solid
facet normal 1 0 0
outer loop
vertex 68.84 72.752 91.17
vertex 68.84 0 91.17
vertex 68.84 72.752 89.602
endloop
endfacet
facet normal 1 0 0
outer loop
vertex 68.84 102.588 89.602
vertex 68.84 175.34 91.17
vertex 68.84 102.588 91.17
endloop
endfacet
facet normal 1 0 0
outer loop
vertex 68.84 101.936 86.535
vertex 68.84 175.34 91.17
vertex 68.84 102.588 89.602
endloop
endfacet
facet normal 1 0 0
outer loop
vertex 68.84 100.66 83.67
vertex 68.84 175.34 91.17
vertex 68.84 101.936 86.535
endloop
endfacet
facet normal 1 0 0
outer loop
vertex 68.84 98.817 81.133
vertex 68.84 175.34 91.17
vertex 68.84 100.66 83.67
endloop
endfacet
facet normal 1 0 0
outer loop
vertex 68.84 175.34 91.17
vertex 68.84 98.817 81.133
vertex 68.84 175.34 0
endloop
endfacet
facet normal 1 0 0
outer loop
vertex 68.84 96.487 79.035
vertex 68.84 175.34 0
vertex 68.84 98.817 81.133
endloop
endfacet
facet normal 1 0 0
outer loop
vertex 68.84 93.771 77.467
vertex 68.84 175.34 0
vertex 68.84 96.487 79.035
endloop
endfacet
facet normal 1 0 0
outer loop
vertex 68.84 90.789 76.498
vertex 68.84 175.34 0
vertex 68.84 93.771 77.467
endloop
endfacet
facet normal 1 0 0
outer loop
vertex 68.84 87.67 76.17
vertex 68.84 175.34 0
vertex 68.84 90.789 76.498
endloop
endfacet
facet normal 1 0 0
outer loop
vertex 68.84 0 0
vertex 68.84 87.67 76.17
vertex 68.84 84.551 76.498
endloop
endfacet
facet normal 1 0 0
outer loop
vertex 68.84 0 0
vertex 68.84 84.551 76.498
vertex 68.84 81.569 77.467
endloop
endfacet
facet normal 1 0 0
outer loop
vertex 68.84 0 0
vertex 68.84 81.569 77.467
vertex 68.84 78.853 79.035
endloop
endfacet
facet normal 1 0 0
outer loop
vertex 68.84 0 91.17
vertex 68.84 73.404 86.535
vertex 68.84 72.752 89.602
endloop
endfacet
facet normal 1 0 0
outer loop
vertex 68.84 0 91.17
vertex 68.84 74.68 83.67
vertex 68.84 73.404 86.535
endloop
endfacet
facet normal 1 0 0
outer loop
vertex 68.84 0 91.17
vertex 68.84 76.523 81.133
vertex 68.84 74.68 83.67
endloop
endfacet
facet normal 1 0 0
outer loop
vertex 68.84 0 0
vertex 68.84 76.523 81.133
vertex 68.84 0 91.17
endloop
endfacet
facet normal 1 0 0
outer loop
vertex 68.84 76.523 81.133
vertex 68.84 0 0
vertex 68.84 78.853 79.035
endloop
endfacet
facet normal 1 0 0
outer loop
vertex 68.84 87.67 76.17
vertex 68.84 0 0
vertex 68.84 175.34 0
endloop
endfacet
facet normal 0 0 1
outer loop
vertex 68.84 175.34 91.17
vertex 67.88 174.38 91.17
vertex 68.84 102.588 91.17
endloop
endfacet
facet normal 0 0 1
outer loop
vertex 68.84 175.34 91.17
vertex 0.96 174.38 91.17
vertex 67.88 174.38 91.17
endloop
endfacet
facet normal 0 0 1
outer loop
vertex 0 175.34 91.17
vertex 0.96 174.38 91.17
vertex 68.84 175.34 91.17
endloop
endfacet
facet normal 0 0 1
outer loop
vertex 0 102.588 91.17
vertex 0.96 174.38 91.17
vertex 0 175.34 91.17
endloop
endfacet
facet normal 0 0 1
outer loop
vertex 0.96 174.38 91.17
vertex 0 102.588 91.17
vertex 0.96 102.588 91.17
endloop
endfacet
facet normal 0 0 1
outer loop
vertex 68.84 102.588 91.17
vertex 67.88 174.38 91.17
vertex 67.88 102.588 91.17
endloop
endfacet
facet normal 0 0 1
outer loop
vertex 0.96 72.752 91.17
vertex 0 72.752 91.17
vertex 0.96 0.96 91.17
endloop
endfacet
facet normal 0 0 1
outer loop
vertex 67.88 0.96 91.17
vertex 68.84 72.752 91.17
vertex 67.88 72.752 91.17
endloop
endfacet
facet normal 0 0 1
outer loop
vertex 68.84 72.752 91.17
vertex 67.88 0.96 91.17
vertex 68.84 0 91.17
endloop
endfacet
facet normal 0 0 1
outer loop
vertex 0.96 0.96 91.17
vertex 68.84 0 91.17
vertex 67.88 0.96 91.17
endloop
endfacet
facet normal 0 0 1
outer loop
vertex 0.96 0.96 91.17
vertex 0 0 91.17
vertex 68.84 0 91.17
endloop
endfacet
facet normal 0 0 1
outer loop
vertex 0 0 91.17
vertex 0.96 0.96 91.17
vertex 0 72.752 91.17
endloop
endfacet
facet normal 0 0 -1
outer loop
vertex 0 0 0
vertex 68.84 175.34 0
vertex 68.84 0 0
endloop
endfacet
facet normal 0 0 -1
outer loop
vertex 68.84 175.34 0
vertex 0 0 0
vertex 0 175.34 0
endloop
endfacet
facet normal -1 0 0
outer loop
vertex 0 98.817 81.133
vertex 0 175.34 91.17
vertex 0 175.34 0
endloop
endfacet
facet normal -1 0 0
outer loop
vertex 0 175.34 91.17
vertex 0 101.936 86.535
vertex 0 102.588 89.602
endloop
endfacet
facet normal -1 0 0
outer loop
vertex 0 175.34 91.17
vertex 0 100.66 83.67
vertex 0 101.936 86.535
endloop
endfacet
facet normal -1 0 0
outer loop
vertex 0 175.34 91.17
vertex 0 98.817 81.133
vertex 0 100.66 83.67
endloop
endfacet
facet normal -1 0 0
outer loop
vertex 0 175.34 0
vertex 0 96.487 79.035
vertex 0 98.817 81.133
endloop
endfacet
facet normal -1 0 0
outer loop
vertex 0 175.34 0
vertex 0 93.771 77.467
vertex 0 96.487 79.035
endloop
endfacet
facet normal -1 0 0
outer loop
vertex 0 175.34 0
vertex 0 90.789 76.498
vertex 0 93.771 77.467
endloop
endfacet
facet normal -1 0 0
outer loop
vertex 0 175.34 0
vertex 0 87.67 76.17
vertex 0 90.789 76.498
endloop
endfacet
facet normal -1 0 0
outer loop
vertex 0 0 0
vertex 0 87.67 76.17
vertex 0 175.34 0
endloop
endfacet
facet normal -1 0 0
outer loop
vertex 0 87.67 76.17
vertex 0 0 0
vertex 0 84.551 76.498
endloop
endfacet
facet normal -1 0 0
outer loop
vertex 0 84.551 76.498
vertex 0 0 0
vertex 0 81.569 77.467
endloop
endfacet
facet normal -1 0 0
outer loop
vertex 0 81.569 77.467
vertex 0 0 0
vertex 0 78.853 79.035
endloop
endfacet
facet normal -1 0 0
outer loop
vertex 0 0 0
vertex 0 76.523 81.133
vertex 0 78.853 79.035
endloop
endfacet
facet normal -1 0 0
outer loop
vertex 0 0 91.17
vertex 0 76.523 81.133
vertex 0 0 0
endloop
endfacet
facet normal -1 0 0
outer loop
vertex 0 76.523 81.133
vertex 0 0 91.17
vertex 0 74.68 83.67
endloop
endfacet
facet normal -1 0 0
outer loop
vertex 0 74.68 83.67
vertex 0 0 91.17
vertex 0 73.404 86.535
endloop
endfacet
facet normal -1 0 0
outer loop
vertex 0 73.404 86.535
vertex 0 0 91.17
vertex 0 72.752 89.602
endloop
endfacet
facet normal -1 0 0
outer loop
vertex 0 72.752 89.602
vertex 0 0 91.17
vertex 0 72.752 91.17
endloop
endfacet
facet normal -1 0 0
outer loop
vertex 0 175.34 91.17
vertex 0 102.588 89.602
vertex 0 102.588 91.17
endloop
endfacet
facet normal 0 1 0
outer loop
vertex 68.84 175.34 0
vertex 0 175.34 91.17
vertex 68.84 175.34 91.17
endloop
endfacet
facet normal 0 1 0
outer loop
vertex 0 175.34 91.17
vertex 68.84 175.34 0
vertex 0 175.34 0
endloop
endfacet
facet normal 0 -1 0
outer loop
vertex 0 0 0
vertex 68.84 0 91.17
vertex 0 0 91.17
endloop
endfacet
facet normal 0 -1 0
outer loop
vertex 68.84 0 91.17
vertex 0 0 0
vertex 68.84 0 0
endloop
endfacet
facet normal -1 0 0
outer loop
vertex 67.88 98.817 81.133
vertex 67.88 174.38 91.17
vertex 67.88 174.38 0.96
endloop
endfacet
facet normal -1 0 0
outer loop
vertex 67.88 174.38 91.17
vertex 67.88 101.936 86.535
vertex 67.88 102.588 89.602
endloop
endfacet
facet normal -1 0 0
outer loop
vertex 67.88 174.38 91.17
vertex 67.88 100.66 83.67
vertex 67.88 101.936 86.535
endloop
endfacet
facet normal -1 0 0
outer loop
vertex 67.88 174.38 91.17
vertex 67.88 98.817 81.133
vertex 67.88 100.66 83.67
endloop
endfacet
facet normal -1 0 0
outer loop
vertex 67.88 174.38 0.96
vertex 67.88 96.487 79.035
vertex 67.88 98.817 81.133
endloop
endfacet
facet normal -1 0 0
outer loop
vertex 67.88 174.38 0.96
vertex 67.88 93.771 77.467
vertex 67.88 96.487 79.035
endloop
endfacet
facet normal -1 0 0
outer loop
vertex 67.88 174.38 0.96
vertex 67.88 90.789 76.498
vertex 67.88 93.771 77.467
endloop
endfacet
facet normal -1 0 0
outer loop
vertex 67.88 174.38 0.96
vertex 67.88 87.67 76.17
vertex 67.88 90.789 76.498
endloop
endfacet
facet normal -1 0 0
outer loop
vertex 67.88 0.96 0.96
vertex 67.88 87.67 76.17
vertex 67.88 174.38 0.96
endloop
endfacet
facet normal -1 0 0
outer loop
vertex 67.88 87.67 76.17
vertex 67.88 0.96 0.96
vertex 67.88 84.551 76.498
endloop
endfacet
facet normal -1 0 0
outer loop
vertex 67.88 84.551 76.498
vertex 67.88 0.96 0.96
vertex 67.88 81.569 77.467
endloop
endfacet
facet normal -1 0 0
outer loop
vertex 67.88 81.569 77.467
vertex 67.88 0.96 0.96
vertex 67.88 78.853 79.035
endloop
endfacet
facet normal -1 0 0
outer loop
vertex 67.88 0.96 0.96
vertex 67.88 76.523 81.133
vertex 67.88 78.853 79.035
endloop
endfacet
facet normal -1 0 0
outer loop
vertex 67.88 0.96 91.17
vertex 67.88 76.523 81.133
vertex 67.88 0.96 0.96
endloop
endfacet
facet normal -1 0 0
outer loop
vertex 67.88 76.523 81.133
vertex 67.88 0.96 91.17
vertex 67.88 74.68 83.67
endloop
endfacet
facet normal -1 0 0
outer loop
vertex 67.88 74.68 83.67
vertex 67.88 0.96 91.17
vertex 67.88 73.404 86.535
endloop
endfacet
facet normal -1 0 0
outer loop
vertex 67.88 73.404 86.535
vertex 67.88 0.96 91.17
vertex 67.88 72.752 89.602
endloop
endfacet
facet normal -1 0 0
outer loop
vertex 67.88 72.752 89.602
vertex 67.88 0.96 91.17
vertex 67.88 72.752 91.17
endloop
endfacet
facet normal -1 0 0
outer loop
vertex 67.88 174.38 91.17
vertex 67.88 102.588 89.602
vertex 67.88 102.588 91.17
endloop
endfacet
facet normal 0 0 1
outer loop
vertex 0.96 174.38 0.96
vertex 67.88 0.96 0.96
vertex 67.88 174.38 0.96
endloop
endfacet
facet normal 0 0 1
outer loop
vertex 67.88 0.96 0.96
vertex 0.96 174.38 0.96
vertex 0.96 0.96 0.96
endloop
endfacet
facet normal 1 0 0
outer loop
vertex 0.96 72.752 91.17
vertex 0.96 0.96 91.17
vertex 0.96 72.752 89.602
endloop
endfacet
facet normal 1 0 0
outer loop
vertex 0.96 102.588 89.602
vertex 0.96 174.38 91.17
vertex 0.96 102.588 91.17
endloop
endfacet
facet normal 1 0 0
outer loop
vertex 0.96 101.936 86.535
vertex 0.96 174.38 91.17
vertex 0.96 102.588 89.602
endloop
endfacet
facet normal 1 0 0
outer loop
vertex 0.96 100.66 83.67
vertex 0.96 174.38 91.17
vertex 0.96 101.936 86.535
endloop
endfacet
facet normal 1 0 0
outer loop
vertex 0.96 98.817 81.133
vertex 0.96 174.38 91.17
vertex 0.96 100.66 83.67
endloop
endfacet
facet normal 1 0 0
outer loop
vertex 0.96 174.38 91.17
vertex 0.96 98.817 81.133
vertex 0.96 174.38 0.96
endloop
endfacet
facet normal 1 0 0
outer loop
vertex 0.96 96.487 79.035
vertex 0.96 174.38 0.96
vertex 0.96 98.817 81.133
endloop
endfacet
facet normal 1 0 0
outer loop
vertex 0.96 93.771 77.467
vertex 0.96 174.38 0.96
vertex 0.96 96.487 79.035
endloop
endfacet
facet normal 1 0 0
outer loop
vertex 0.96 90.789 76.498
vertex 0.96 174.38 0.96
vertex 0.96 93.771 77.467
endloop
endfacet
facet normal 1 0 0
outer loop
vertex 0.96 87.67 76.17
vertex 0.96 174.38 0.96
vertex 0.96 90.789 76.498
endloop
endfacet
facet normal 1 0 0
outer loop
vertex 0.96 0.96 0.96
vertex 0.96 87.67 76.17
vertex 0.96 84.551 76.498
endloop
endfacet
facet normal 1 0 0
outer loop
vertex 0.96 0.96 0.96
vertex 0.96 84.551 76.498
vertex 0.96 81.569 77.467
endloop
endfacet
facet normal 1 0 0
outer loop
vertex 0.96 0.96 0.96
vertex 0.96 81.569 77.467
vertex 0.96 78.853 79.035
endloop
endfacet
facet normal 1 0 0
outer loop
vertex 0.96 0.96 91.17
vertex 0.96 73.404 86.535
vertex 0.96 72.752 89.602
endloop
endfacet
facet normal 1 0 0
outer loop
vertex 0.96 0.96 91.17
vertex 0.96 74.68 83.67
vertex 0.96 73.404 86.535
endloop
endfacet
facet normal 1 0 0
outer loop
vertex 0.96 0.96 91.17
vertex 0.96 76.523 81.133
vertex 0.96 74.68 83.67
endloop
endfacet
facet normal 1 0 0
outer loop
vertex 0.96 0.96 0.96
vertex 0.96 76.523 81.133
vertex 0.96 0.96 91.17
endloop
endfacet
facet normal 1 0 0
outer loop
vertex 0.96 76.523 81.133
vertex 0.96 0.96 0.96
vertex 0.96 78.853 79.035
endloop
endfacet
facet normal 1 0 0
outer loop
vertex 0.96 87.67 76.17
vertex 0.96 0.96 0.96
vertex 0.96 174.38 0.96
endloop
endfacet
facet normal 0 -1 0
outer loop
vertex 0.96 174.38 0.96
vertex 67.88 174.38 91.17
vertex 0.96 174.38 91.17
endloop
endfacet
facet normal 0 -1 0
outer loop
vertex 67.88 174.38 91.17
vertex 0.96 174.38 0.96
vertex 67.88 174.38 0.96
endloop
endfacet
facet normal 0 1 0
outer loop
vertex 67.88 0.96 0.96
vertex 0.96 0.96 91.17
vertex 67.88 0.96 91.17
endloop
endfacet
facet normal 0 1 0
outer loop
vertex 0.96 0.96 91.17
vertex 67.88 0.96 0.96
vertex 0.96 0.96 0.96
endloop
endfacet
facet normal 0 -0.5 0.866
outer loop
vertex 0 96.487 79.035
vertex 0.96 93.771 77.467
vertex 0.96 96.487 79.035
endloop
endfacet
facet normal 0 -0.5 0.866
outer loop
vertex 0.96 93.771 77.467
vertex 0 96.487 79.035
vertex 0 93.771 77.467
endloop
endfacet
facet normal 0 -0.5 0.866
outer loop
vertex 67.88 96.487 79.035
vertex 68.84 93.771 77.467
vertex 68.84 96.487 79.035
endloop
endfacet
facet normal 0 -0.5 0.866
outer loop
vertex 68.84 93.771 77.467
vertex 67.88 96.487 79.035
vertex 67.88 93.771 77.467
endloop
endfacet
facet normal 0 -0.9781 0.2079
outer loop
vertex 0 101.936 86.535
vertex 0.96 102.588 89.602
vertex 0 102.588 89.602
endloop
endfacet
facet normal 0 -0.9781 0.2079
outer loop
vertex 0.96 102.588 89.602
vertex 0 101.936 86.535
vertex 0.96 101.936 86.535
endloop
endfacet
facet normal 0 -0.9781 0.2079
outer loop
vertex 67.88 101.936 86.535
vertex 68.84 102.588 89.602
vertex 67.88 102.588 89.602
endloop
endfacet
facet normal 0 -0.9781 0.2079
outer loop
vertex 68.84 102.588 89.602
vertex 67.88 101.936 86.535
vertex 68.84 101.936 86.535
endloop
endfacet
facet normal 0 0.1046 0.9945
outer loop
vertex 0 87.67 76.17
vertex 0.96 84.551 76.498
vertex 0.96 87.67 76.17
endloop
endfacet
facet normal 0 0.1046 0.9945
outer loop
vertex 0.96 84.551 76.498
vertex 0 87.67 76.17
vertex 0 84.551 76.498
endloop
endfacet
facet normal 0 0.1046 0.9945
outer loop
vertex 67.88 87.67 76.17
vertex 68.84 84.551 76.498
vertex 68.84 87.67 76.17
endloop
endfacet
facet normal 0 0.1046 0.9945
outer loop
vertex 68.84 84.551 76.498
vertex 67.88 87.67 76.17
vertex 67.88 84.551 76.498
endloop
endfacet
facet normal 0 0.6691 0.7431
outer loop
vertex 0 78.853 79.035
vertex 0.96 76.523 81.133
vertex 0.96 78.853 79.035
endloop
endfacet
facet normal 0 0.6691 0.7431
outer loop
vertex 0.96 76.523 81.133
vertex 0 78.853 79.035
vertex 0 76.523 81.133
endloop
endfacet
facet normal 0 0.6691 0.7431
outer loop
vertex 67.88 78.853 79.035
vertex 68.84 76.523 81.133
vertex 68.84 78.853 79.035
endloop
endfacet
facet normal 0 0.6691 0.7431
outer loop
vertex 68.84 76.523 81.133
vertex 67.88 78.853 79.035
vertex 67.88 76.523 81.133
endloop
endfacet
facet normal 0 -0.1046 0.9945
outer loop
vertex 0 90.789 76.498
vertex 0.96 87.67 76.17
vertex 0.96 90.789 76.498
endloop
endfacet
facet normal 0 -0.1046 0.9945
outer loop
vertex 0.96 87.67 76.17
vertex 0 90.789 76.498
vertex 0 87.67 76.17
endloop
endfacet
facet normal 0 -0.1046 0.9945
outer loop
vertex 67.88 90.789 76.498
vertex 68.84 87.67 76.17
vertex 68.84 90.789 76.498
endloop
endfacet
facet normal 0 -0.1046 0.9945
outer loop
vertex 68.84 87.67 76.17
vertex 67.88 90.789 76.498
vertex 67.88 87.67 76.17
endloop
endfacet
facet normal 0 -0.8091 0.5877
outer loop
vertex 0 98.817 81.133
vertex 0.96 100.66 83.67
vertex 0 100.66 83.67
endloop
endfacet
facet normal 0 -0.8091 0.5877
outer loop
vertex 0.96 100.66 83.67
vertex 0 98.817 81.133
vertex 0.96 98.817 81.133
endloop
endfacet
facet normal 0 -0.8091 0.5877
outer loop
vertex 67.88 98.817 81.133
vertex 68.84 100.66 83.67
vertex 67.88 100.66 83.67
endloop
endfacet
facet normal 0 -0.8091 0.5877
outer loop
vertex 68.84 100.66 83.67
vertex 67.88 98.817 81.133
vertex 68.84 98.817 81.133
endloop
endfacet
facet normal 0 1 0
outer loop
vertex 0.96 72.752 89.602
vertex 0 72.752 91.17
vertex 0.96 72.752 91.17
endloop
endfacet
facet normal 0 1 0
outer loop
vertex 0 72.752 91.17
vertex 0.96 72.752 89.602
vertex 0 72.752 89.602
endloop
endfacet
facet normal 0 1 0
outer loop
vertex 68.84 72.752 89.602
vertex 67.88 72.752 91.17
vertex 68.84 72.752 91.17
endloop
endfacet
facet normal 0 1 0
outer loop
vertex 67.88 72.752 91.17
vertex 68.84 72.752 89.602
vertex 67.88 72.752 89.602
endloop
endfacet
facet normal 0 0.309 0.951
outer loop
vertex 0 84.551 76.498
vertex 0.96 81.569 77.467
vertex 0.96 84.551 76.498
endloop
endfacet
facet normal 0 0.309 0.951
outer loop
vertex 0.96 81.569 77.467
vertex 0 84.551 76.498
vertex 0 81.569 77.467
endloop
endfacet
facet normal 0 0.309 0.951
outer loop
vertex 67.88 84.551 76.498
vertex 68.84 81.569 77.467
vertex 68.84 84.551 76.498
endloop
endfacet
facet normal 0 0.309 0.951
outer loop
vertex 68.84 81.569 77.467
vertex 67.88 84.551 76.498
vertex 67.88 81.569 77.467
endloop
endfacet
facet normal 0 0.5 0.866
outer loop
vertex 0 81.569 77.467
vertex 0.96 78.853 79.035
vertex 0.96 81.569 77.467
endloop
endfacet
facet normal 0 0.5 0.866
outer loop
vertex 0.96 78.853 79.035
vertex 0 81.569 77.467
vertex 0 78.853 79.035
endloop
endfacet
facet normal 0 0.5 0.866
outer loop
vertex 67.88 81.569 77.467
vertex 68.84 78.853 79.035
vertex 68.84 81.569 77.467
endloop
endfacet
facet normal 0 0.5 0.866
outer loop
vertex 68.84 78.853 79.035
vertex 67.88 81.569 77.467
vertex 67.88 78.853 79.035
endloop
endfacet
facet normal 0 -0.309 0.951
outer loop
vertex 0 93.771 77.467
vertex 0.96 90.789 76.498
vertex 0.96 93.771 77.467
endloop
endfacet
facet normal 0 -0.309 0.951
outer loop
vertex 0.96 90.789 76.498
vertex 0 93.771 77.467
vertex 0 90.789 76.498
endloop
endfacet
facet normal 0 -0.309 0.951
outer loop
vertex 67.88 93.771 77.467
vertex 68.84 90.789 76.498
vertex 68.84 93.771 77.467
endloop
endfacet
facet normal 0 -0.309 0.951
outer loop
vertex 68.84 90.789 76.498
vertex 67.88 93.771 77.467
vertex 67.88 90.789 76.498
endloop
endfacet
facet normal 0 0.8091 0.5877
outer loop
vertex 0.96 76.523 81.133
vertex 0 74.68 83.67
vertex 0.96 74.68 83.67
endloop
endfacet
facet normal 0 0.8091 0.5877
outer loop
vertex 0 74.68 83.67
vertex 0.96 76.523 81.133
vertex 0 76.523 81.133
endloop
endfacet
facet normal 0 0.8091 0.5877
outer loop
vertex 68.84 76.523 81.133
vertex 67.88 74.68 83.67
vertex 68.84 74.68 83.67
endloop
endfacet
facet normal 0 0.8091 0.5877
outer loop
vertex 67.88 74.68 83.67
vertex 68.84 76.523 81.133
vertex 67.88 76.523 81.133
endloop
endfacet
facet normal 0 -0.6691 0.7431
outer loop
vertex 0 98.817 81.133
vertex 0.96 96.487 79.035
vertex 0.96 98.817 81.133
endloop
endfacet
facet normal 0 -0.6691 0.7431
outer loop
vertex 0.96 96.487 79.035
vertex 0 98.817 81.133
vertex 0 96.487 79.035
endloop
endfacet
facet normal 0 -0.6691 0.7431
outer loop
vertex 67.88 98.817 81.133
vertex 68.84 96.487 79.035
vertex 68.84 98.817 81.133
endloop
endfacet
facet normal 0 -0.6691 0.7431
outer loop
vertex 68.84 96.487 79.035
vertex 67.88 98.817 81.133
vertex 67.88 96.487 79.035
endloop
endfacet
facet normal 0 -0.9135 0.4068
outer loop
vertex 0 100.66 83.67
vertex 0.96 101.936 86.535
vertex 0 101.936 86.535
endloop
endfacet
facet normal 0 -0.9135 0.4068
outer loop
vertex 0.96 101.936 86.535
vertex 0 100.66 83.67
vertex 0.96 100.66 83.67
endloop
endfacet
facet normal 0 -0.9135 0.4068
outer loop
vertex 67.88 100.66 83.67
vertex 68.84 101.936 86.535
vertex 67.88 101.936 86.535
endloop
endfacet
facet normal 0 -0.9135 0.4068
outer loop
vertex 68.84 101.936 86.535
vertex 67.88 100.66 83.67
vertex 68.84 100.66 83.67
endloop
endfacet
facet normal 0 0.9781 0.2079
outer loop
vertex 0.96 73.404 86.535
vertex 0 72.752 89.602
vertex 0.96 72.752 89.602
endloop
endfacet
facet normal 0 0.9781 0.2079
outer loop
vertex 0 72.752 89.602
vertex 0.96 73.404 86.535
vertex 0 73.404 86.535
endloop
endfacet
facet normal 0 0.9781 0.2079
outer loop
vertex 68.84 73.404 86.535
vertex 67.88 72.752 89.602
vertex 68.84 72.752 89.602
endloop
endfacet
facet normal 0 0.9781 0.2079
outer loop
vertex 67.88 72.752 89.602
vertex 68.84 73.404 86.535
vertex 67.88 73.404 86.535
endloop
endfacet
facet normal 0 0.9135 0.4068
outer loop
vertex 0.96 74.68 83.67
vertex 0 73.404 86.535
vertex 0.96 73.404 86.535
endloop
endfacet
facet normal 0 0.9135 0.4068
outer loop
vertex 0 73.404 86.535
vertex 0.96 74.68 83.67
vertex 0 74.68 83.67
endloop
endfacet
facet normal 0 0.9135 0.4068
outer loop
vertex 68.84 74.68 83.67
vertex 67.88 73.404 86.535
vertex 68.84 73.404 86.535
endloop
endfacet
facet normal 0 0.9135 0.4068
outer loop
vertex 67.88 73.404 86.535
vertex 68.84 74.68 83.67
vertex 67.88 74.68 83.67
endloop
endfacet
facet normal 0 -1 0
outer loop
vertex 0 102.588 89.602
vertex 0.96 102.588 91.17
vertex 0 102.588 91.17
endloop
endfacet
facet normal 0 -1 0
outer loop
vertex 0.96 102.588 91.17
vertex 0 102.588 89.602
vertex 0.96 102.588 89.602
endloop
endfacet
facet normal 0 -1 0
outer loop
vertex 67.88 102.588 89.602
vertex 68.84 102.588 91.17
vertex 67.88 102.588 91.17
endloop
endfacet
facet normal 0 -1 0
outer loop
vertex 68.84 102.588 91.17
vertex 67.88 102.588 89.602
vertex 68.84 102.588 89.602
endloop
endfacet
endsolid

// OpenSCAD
cardWidth=63.5;
cardHeight=88.5;
cardThickness=0.34;

cardPerBox=500;
cardBlockLength=cardThickness*cardPerBox;

spaceAroundCard=0.25;
spaceAroundLid=0.5;

wallthickness=0.96;

fingerCutout=30;

// 1 for base box, 0 for lid
boxOrLid=0;

if (boxOrLid) {
    mainBox();
} else {
    mainLid();
}

module mainBox () {
    difference() {
        Box();
        translate([
            (cardWidth+(spaceAroundCard*2)+(wallthickness*2))/2,
            cardBlockLength+(spaceAroundCard*2)+(wallthickness*3),
            cardHeight+spaceAroundCard+wallthickness
            ]){
            rotate(a=[90,0,0]){
                cylinder(h=(cardBlockLength+(spaceAroundCard*2)+(wallthickness*4)),d=fingerCutout);
            }
        }
    }
}


module Box () {
    difference() {
        cube([
        cardWidth+(spaceAroundCard*2)+(wallthickness*2),
        cardBlockLength+(spaceAroundCard*2)+(wallthickness*2),
        cardHeight+spaceAroundCard+wallthickness
        ]);
        translate([wallthickness,wallthickness,wallthickness]) {
            cube([
            cardWidth+(spaceAroundCard*2),
            cardBlockLength+(spaceAroundCard*2),
            cardHeight+spaceAroundCard+wallthickness
            ]);
        }
    }
}

module mainLid () {
    difference() {
        LidBox();
        translate([
            -spaceAroundLid,
            (cardBlockLength+(spaceAroundCard*2)+(wallthickness*4)+(spaceAroundLid*2))/2,
            cardHeight+spaceAroundCard+(wallthickness*2)+(spaceAroundLid)
            ]){
            rotate(a=[0,90,0]){
                cylinder(h=cardWidth+(spaceAroundCard*2)+(wallthickness*4)+(spaceAroundLid*4),d=fingerCutout);
            }
        }
    }
}


module LidBox () {
    difference() {
        cube([
        cardWidth+(spaceAroundCard*2)+(wallthickness*4)+(spaceAroundLid*2),
        cardBlockLength+(spaceAroundCard*2)+(wallthickness*4)+(spaceAroundLid*2),
        cardHeight+spaceAroundCard+(wallthickness*2)+(spaceAroundLid)
        ]);
        translate([wallthickness,wallthickness,wallthickness]) {
            cube([
            cardWidth+(spaceAroundCard*2)+(wallthickness*2)+(spaceAroundLid*2),
            cardBlockLength+(spaceAroundCard*2)+(wallthickness*2)+(spaceAroundLid*2),
            cardHeight+spaceAroundCard+(wallthickness*2)+(spaceAroundLid)
            ]);
        }
    }
}
